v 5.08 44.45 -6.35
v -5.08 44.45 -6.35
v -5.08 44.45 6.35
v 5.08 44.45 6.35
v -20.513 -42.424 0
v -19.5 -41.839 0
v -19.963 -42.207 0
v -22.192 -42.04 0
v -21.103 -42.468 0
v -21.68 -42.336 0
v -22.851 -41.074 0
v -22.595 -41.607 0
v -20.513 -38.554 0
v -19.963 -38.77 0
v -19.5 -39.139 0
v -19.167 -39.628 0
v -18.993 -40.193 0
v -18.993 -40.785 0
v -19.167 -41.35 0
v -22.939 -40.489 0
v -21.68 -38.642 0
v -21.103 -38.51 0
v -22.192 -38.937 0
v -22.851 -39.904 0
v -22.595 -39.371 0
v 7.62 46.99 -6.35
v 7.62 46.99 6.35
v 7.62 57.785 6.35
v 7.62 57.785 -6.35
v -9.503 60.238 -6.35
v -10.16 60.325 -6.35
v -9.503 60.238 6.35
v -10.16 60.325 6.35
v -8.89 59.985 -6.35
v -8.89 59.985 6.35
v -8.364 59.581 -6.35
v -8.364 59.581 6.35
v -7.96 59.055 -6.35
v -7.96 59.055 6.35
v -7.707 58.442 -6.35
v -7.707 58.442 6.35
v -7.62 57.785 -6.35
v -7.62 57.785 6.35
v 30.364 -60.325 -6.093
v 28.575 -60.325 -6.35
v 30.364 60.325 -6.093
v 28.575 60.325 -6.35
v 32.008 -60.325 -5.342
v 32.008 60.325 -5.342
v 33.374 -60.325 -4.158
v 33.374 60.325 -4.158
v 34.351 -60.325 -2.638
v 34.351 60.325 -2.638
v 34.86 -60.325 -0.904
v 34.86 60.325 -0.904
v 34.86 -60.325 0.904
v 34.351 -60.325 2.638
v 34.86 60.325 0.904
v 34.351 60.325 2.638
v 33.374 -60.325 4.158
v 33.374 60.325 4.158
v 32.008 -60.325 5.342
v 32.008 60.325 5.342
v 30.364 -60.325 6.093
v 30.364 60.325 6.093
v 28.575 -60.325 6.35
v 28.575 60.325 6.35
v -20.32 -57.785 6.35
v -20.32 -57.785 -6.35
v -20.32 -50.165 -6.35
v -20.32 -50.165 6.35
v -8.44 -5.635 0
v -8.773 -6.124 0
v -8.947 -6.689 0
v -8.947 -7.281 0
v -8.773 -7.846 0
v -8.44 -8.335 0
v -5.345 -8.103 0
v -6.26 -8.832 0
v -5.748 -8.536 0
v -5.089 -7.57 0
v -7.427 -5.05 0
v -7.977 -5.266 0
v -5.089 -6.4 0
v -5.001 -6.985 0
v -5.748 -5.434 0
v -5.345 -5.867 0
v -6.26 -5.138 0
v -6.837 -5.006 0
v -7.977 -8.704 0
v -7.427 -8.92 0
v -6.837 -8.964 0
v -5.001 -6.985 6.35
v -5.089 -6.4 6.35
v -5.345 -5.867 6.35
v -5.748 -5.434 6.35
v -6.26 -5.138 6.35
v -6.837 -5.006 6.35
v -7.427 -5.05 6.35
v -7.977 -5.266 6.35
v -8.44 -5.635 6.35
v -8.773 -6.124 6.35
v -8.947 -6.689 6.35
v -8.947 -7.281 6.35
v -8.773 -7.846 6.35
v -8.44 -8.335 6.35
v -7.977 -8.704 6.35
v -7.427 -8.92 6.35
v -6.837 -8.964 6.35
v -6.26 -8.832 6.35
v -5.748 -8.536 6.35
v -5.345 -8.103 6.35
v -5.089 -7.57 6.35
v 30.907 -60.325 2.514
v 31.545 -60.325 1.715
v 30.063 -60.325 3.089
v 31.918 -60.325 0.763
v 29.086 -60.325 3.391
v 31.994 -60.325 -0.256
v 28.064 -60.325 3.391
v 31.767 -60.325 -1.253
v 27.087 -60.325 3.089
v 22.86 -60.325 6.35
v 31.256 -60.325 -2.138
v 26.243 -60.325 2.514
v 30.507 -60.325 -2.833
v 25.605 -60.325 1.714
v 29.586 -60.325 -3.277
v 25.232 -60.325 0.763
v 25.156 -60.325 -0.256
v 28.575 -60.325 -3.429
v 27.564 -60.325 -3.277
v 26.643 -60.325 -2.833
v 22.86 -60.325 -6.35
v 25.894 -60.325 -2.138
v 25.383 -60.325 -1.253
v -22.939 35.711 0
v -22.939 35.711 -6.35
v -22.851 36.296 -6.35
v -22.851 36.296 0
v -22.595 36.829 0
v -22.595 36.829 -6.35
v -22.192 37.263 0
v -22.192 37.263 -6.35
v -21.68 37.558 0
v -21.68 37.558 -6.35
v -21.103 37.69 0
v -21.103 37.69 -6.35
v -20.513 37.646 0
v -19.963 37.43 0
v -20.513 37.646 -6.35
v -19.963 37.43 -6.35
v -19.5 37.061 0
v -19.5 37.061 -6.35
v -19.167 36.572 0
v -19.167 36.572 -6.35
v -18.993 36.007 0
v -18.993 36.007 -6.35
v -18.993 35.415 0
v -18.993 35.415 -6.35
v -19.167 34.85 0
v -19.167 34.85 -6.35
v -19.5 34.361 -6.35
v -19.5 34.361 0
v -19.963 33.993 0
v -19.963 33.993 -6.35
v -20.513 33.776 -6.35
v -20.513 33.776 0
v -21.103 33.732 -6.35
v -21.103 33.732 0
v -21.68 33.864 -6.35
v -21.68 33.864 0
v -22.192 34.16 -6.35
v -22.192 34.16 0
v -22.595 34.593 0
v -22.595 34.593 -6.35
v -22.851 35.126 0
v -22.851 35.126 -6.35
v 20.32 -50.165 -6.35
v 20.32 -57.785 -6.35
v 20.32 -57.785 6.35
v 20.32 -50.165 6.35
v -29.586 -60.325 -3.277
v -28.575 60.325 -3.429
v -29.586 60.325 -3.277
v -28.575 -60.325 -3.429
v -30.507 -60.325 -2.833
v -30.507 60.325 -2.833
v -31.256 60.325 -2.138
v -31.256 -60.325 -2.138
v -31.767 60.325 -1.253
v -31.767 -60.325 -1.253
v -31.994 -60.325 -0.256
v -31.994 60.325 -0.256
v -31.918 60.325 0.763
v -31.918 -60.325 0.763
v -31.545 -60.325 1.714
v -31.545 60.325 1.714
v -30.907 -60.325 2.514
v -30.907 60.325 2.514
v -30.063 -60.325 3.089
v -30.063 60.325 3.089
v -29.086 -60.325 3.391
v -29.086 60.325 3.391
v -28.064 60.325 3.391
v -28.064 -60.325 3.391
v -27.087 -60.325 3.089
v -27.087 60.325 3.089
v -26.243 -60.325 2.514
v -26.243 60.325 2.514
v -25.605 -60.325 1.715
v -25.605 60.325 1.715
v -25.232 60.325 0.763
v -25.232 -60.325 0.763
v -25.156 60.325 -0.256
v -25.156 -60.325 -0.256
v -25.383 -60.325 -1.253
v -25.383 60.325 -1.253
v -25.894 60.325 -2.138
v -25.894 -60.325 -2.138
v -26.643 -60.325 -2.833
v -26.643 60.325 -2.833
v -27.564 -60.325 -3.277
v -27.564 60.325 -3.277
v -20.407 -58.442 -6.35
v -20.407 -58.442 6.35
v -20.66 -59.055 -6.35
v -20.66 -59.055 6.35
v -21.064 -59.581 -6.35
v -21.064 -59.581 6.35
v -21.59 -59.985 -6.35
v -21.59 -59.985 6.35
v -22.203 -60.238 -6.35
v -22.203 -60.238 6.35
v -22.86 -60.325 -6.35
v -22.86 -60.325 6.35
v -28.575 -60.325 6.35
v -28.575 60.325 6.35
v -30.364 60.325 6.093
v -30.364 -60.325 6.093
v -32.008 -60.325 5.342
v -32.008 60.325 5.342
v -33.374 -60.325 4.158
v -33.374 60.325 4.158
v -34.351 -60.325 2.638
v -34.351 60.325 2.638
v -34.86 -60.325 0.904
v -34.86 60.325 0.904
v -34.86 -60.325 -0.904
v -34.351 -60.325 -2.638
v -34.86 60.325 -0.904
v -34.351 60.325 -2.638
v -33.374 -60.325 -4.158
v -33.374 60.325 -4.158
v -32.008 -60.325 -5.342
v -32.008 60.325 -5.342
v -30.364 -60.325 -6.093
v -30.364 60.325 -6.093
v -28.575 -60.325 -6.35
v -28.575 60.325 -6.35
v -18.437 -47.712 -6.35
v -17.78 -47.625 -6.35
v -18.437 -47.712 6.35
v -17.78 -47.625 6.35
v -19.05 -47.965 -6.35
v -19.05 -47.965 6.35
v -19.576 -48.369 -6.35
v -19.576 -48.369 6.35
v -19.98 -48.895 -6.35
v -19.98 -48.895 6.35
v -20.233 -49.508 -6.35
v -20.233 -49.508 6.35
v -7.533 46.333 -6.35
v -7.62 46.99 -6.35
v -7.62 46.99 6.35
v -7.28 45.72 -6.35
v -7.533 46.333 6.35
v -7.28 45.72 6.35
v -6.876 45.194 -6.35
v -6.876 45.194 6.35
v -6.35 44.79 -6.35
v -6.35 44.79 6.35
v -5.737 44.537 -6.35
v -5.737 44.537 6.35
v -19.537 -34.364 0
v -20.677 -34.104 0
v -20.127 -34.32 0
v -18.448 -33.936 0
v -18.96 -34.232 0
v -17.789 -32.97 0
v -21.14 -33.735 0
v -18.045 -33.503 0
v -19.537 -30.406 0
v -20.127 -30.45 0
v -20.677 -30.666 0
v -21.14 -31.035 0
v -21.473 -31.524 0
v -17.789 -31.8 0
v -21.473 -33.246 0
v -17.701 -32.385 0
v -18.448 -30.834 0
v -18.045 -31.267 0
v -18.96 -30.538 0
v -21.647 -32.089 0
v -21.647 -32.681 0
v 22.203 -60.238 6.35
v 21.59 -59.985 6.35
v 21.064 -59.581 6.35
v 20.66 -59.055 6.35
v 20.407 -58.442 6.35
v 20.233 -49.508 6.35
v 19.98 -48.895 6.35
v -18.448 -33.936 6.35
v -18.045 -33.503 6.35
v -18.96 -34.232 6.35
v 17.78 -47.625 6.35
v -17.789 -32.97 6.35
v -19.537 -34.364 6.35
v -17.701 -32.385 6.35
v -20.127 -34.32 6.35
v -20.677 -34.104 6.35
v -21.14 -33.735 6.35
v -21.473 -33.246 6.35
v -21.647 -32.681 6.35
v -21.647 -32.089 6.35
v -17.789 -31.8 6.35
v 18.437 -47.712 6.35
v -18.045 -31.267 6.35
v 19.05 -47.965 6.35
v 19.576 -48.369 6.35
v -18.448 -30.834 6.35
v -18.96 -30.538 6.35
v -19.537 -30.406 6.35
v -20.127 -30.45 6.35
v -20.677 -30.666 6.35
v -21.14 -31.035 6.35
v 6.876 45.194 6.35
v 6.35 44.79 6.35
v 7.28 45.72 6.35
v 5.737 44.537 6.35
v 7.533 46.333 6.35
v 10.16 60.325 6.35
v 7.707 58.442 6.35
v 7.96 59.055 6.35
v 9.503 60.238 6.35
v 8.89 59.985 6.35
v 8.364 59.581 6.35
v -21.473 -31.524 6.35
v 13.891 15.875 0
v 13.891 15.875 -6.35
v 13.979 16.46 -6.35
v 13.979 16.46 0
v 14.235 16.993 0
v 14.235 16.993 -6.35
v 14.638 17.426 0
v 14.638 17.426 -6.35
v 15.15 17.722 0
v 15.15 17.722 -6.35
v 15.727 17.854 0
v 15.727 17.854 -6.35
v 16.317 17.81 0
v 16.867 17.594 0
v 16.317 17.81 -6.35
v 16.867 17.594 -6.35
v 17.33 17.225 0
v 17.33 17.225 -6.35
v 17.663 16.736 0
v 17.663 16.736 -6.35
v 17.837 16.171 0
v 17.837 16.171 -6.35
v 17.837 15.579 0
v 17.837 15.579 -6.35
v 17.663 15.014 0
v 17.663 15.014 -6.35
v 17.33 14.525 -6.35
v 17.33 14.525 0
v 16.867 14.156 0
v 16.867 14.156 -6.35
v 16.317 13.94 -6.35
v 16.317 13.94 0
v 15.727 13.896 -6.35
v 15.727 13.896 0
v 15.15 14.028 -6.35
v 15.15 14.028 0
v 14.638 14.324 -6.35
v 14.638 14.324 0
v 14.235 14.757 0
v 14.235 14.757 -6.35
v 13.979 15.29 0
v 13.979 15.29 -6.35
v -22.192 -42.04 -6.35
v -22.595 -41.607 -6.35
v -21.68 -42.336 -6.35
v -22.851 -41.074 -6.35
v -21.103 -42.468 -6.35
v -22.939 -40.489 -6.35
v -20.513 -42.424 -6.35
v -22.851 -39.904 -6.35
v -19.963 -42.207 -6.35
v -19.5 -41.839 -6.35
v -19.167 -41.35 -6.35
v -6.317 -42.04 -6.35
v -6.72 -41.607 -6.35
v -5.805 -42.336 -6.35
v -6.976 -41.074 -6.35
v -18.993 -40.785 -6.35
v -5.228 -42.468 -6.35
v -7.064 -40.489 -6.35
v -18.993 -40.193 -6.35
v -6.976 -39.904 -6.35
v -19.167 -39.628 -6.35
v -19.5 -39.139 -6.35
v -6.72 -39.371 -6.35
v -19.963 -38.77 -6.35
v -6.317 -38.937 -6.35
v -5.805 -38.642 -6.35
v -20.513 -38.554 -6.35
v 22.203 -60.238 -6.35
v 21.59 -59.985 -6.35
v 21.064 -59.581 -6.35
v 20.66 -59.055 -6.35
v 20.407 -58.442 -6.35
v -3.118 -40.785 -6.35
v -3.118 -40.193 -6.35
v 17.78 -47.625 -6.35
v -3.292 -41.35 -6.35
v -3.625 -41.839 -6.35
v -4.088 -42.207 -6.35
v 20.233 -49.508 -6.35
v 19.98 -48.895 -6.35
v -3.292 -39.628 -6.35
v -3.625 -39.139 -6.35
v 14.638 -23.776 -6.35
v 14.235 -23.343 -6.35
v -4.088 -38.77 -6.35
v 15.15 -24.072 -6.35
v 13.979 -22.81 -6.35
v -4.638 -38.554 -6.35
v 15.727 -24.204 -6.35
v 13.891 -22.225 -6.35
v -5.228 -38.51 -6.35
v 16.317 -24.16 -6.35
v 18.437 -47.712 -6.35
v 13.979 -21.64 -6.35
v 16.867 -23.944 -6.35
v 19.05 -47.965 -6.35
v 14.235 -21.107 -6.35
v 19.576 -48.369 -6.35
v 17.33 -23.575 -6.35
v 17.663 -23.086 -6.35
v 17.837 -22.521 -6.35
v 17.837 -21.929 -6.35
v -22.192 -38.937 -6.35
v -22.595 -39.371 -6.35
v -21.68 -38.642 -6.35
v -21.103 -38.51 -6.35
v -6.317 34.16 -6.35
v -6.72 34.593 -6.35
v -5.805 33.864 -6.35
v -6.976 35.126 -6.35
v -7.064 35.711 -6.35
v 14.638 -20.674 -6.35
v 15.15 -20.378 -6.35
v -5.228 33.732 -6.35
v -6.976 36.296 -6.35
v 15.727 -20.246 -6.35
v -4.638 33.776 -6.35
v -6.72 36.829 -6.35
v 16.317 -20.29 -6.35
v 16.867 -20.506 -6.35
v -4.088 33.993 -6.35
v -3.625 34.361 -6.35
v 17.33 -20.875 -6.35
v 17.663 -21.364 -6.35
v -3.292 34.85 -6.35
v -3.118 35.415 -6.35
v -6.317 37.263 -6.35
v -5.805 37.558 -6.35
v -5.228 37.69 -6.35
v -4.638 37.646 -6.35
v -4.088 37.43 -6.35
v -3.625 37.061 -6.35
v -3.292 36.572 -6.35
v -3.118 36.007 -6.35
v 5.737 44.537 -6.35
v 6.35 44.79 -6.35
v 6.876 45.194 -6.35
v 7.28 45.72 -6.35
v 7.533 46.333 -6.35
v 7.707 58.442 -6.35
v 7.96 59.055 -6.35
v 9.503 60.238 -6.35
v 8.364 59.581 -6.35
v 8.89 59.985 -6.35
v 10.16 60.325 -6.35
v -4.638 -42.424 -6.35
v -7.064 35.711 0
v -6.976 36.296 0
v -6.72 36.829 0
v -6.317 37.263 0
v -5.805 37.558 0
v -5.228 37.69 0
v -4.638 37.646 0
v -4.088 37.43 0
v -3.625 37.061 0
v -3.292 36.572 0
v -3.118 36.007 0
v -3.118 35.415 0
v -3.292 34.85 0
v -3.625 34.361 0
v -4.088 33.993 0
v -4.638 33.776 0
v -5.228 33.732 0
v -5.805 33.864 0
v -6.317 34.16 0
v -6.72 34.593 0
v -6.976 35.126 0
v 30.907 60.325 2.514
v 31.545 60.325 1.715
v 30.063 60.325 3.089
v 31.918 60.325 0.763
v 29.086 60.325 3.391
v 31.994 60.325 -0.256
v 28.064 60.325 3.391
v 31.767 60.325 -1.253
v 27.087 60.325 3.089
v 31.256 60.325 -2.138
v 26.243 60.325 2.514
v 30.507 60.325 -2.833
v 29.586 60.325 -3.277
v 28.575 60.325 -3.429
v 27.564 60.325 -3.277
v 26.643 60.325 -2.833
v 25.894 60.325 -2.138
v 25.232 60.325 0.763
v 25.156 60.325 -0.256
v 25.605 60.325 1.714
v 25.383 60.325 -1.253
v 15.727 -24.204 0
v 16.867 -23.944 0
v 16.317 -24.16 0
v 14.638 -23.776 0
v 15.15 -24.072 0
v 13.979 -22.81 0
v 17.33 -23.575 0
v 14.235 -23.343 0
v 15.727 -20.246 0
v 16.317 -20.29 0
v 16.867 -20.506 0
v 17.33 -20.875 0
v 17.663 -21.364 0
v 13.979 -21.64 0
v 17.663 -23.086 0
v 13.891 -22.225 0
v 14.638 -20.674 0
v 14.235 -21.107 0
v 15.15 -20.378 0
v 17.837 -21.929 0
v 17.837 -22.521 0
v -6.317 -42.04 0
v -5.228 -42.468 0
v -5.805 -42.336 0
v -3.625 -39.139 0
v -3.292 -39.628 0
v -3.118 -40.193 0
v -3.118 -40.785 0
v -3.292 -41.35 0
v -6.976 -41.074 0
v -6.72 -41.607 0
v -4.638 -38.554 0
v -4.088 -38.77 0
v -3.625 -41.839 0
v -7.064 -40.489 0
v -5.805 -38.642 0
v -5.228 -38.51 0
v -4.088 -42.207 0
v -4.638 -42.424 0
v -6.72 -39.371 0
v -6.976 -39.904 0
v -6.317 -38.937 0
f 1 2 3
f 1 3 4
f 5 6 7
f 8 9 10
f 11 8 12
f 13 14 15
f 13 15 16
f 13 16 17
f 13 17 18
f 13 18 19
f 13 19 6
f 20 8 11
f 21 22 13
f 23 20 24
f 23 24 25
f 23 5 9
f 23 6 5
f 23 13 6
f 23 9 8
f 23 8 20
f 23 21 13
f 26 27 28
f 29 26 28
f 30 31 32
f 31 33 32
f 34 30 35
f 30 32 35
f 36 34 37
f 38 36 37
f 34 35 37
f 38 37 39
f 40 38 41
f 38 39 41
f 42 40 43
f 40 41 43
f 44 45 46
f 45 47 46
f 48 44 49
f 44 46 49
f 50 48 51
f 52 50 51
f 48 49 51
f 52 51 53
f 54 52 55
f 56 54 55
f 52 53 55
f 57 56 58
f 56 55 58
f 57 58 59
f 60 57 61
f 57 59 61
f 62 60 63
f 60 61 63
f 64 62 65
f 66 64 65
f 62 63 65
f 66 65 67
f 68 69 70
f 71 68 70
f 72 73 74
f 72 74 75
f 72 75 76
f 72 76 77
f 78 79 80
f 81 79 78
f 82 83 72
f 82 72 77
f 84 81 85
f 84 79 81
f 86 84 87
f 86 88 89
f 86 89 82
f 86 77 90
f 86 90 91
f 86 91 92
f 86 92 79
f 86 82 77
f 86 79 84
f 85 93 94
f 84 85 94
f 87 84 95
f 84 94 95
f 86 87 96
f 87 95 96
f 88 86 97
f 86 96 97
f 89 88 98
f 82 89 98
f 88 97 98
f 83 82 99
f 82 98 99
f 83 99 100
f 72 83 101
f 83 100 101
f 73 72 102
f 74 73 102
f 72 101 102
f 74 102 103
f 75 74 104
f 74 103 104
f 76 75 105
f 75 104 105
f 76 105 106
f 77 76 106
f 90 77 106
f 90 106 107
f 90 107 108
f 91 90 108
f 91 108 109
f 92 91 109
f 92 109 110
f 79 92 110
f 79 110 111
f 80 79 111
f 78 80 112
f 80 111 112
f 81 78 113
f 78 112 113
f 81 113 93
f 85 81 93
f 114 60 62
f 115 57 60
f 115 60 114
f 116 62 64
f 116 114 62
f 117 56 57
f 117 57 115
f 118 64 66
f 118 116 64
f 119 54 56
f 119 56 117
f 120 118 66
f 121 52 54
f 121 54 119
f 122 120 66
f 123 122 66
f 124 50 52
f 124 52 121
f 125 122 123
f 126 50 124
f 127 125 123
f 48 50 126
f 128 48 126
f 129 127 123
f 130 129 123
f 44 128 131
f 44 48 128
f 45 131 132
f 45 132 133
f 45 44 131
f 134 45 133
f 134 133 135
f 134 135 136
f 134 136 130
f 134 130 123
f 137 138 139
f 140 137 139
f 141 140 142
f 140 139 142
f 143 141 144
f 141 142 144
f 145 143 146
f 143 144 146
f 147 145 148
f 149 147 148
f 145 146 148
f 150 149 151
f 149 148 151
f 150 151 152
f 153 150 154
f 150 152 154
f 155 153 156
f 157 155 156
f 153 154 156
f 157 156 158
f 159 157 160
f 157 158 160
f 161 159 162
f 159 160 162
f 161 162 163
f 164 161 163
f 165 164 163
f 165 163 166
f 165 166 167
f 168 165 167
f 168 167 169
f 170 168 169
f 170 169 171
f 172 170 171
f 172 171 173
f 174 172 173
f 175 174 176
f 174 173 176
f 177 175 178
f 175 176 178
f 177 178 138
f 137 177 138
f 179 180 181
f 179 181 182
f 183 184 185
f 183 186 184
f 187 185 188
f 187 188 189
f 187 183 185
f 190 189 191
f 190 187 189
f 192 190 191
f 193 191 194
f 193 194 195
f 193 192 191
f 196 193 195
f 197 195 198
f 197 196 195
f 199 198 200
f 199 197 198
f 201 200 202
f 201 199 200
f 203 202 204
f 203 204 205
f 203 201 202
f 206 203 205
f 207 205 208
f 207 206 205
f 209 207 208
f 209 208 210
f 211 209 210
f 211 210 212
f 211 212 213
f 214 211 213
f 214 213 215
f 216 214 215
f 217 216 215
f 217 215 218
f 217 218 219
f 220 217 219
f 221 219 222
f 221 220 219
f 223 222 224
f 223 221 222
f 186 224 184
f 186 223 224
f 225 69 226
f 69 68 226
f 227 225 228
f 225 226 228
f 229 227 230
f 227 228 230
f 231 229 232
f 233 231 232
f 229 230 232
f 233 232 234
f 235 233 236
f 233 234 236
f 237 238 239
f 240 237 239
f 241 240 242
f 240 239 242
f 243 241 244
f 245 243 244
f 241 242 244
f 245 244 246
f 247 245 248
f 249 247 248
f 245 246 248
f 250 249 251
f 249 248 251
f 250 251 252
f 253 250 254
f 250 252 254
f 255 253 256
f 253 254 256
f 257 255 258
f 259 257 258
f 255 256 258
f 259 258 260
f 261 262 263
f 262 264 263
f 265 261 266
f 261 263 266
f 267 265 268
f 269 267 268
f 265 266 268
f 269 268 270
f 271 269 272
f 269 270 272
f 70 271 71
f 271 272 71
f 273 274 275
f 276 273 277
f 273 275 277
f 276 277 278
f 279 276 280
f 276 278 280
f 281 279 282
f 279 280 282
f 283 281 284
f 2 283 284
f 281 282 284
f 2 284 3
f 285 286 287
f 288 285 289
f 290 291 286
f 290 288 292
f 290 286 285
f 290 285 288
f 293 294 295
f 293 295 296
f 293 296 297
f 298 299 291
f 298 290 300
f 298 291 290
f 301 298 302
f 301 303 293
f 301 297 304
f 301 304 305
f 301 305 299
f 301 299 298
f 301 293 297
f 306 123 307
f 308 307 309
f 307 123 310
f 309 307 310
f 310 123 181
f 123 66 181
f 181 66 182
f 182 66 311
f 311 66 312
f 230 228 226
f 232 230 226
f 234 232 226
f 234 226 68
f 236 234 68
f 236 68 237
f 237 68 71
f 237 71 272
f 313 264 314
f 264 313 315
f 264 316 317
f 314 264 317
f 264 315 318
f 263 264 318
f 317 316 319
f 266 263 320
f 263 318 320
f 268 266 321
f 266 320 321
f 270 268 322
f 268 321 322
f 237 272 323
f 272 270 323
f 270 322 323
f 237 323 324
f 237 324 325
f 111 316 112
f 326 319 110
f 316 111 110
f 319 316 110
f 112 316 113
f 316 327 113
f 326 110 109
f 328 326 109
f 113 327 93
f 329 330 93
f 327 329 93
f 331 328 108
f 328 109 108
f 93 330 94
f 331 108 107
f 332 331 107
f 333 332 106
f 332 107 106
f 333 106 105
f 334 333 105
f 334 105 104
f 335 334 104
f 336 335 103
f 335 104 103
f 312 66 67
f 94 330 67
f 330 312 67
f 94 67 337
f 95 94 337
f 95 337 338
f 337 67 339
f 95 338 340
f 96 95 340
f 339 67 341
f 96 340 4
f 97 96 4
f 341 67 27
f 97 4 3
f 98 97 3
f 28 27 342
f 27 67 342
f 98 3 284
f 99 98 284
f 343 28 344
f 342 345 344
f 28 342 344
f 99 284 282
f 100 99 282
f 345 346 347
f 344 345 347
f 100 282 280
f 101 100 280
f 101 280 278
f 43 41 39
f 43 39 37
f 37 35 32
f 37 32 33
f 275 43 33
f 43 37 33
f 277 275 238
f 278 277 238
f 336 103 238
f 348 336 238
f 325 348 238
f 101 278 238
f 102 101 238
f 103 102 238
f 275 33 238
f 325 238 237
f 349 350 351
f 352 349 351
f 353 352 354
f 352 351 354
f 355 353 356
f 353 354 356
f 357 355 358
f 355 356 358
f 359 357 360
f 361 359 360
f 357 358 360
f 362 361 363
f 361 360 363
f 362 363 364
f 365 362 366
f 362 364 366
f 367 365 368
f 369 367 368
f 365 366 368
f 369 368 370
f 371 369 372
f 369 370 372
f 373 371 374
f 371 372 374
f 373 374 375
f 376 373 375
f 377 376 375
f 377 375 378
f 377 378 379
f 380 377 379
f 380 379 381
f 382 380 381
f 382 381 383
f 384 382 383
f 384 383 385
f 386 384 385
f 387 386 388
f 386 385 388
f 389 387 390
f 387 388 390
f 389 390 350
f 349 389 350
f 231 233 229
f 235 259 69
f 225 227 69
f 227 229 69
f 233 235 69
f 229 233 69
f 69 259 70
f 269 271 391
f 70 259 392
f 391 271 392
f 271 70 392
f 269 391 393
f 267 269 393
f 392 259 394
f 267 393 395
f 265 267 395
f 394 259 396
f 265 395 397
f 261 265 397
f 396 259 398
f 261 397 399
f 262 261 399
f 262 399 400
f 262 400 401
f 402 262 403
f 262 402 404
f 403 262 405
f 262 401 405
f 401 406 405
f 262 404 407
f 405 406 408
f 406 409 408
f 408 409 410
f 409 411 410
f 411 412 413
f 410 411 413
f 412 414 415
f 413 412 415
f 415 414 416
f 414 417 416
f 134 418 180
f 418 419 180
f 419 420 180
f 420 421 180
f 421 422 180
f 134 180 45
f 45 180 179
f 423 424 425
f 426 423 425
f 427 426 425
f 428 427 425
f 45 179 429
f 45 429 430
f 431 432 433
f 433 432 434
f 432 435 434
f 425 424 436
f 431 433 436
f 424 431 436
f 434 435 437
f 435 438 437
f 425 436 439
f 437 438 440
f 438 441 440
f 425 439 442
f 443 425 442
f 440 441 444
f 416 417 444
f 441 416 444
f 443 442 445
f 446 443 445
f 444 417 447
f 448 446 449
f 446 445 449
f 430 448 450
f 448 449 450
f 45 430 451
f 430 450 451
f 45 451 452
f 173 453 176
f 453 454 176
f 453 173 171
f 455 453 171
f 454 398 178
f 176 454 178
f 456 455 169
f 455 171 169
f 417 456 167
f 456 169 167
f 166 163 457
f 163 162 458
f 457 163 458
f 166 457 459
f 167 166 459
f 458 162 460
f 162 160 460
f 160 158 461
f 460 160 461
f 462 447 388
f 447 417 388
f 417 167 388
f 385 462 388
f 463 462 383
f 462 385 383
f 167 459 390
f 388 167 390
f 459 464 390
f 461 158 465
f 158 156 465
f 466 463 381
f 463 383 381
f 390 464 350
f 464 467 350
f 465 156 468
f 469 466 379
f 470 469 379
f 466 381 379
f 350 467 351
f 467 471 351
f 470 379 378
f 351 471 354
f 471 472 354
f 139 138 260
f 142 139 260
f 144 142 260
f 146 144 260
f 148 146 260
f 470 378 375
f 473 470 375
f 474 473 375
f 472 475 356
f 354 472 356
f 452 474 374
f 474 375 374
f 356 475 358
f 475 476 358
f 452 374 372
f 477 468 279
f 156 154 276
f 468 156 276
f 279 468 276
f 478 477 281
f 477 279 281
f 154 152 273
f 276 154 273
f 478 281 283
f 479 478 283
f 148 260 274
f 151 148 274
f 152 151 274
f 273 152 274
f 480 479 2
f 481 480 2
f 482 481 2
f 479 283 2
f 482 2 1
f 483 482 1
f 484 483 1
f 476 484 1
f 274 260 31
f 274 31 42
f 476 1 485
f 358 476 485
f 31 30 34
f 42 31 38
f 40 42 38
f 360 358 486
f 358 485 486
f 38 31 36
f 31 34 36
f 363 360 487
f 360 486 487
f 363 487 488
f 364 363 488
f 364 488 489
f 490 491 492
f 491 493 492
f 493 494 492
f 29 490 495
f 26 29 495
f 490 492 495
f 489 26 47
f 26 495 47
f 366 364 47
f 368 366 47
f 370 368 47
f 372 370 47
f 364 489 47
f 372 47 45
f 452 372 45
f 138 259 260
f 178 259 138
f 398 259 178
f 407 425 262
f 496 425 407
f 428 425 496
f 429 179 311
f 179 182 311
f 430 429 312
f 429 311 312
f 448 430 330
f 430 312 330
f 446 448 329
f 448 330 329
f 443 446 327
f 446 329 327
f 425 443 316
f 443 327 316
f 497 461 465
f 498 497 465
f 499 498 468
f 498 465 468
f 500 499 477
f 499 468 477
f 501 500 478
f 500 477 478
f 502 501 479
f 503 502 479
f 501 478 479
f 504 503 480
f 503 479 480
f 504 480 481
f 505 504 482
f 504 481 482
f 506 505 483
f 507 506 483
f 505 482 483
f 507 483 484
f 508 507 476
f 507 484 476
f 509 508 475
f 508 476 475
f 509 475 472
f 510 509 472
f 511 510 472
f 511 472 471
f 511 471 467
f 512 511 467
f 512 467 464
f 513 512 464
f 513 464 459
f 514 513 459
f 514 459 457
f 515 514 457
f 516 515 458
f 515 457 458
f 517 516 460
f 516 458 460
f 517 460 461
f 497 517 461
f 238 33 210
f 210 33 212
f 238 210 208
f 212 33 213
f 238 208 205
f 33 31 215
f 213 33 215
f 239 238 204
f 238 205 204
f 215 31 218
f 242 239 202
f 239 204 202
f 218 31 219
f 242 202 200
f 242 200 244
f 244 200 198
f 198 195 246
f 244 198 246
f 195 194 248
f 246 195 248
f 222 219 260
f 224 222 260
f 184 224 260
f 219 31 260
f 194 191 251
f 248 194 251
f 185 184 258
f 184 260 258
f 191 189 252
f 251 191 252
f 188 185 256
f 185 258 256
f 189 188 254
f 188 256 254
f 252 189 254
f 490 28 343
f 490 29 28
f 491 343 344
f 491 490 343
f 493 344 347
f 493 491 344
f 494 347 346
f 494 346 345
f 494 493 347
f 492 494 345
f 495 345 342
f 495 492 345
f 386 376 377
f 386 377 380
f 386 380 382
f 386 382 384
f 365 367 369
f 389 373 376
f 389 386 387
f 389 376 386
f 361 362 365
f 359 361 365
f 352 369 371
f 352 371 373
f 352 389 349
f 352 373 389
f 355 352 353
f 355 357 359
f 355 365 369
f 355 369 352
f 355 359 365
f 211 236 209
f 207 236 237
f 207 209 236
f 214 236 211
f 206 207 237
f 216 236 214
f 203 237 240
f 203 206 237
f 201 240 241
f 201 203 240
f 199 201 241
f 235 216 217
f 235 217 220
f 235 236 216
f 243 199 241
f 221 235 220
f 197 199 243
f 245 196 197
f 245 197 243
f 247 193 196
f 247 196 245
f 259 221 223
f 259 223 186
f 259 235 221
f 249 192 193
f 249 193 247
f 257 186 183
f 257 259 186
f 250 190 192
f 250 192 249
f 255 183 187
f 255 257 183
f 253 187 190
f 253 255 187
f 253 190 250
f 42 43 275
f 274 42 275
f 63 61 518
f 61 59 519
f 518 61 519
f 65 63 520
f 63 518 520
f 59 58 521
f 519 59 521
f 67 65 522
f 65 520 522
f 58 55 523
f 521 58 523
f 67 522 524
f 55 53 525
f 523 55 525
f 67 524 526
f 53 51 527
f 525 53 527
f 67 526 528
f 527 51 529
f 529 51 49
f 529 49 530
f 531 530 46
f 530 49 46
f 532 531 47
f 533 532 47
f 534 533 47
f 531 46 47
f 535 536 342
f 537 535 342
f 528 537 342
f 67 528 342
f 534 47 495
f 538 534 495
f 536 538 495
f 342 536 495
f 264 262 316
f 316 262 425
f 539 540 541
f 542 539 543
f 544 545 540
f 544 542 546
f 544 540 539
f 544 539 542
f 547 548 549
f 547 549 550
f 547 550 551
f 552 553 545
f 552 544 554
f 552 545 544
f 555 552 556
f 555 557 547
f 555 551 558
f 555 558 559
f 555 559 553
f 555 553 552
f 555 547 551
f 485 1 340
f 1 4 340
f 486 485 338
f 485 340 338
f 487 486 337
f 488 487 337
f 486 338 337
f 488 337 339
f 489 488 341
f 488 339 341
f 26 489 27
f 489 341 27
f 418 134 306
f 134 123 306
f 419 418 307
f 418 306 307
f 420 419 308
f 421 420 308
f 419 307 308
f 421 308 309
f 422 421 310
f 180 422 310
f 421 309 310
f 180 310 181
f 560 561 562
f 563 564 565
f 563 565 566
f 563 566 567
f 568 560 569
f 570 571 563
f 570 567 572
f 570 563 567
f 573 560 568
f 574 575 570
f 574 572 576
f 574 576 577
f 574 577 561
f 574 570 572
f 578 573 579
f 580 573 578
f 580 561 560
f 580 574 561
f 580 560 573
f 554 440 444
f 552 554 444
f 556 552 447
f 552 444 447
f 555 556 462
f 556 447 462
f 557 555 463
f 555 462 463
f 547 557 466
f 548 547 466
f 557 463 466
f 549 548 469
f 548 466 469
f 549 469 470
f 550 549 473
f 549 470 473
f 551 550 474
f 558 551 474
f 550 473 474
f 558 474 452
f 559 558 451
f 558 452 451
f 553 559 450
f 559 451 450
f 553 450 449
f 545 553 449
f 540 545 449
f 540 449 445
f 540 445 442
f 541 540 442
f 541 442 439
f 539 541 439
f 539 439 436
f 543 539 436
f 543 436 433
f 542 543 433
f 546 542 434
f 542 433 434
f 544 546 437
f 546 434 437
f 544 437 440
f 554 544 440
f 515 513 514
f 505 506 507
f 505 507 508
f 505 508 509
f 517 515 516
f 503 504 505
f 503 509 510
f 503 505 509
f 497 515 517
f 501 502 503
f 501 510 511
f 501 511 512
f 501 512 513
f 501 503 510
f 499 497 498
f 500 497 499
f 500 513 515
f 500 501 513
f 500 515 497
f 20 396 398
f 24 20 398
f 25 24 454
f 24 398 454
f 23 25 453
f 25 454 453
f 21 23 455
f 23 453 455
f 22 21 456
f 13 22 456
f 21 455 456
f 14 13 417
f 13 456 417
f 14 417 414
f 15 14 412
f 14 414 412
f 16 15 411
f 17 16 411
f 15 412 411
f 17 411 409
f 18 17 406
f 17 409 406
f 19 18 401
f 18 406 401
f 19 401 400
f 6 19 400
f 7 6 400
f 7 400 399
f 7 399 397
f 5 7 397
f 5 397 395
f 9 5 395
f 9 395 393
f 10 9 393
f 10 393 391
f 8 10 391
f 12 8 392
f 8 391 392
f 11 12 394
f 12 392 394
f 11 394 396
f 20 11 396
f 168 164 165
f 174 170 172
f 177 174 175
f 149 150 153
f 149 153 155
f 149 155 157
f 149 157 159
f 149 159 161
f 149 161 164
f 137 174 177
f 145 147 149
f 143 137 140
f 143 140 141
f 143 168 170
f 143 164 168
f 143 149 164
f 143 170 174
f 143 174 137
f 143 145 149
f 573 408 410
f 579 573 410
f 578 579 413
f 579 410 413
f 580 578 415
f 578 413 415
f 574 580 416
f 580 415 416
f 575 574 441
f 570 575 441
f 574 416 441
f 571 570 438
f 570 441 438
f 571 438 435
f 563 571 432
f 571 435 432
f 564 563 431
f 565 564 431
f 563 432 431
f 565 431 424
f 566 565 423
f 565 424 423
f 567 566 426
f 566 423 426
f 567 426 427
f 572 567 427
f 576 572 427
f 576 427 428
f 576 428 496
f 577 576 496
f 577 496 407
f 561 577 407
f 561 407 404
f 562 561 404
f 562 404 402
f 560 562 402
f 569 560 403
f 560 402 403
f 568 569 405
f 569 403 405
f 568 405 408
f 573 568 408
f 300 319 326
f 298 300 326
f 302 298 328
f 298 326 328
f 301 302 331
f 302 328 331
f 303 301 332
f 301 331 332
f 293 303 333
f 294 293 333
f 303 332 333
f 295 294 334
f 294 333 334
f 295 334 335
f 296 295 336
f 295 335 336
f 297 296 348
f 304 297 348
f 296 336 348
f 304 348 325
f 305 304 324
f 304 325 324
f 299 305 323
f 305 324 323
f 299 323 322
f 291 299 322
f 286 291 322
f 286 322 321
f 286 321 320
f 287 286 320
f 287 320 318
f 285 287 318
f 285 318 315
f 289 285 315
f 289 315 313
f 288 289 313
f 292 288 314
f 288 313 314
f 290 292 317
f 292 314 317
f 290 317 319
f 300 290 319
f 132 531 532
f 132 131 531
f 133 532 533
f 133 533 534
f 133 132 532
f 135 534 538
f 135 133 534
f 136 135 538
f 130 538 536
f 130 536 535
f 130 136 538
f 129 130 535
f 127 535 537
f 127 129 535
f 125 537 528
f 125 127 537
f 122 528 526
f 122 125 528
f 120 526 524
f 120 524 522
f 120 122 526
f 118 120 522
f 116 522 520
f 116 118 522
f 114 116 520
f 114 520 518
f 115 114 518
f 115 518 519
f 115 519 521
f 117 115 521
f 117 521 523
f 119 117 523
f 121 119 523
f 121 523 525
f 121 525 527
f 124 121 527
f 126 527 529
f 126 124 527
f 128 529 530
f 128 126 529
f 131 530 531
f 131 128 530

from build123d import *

# Parameters (mm, degrees)
SKETCH1_R               = 3.429
BOSS_EXTRUDE1_DEPTH     = 60.325
CUT_EXTRUDE1_DEPTH      = 70.9941694
CUT_EXTRUDE1_DEPTH_BACK = 70.9941694
FILLET1_R               = 2.54
CUT_EXTRUDE3_DEPTH      = 71.853025694
CUT_EXTRUDE3_DEPTH_BACK = 71.853025694
SKETCH5_W               = 40.64
SKETCH5_H               = 12.7
FILLET2_R               = 2.54
SKETCH4_R               = 1.984375
CUT_EXTRUDE2_DEPTH      = 6.35
SKETCH6_R               = 1.984375
CUT_EXTRUDE4_DEPTH      = 6.35
SKETCH7_R               = 1.984375
CUT_EXTRUDE5_DEPTH      = 6.35


with BuildPart() as part:
    # Sketch1 → Boss-Extrude1 (new, symmetric)
    with BuildSketch(Plane(origin=(0, 0, 0), x_dir=(1, 0, 0), z_dir=(0, 1, 0))):
        with BuildLine():
            Line((-28.575, 6.35), (28.575, 6.35))
            ThreePointArc((28.575, 6.35), (34.925, 0), (28.575, -6.35))
            Line((28.575, -6.35), (-28.575, -6.35))
            ThreePointArc((-28.575, -6.35), (-34.925, 0), (-28.575, 6.35))
        make_face()
        with Locations(Location((28.575, 0, 0), (0, 0, 90))):
            Circle(SKETCH1_R, mode=Mode.SUBTRACT)
        with Locations(Location((-28.575, 0, 0), (0, 0, 90))):
            Circle(SKETCH1_R, mode=Mode.SUBTRACT)
    extrude(amount=BOSS_EXTRUDE1_DEPTH, both=True)

    # Sketch2 → Cut-Extrude1 (cut, two sides: drawn at the far end of the back side and taken through both)
    with BuildSketch(Plane.XY.offset(-CUT_EXTRUDE1_DEPTH_BACK)):
        Polygon((-7.62, 326.18824101), (-7.62, 60.325), (-7.62, 44.45), (7.62, 44.45), (7.62, 60.325), (7.62, 326.18824101), (7.62, 857.914723029), (-7.62, 857.914723029), align=None)
    extrude(amount=CUT_EXTRUDE1_DEPTH + CUT_EXTRUDE1_DEPTH_BACK, mode=Mode.SUBTRACT)

    # Fillet1
    fillet1_edges = [part.edges().sort_by_distance(p)[0] for p in [
        (-7.62, 44.45, 0),
        (7.62, 44.45, 0),
        (7.62, 60.325, 0),
        (-7.62, 60.325, 0),
    ]]
    fillet(fillet1_edges, radius=FILLET1_R)

    # Sketch5 → Cut-Extrude3 (cut, two sides: drawn at the far end of the back side and taken through both)
    with BuildSketch(Plane.XY.offset(6.35).offset(-CUT_EXTRUDE3_DEPTH_BACK)):
        with Locations((0, -53.975)):
            Rectangle(SKETCH5_W, SKETCH5_H)
    extrude(amount=CUT_EXTRUDE3_DEPTH + CUT_EXTRUDE3_DEPTH_BACK, mode=Mode.SUBTRACT)

    # Fillet2
    fillet2_edges = [part.edges().sort_by_distance(p)[0] for p in [
        (-20.32, -60.325, 0),
        (-20.32, -47.625, 0),
        (20.32, -47.625, 0),
        (20.32, -60.325, 0),
    ]]
    fillet(fillet2_edges, radius=FILLET2_R)

    # Sketch4 → Cut-Extrude2 (cut)
    with BuildSketch(Plane.XY.offset(6.35)):
        with Locations((-6.985, -6.985)):
            Circle(SKETCH4_R)
        with Locations((-19.685, -32.385)):
            Circle(SKETCH4_R)
    extrude(amount=-CUT_EXTRUDE2_DEPTH, mode=Mode.SUBTRACT)

    # Sketch6 → Cut-Extrude4 (cut)
    with BuildSketch(Plane(origin=(0, 0, -6.35), x_dir=(-1, 0, 0), z_dir=(0, 0, -1))):
        with Locations((5.08, 35.711069013)):
            Circle(SKETCH6_R)
        with Locations((20.955, 35.711069013)):
            Circle(SKETCH6_R)
        with Locations((5.08, -40.488930987)):
            Circle(SKETCH6_R)
        with Locations((20.955, -40.488930987)):
            Circle(SKETCH6_R)
    extrude(amount=-CUT_EXTRUDE4_DEPTH, mode=Mode.SUBTRACT)

    # Sketch7 → Cut-Extrude5 (cut)
    with BuildSketch(Plane(origin=(0, 0, -6.35), x_dir=(-1, 0, 0), z_dir=(0, 0, -1))):
        with Locations((-15.875, 15.875)):
            Circle(SKETCH7_R)
        with Locations((-15.875, -22.225)):
            Circle(SKETCH7_R)
    extrude(amount=-CUT_EXTRUDE5_DEPTH, mode=Mode.SUBTRACT)


solid = part.part
